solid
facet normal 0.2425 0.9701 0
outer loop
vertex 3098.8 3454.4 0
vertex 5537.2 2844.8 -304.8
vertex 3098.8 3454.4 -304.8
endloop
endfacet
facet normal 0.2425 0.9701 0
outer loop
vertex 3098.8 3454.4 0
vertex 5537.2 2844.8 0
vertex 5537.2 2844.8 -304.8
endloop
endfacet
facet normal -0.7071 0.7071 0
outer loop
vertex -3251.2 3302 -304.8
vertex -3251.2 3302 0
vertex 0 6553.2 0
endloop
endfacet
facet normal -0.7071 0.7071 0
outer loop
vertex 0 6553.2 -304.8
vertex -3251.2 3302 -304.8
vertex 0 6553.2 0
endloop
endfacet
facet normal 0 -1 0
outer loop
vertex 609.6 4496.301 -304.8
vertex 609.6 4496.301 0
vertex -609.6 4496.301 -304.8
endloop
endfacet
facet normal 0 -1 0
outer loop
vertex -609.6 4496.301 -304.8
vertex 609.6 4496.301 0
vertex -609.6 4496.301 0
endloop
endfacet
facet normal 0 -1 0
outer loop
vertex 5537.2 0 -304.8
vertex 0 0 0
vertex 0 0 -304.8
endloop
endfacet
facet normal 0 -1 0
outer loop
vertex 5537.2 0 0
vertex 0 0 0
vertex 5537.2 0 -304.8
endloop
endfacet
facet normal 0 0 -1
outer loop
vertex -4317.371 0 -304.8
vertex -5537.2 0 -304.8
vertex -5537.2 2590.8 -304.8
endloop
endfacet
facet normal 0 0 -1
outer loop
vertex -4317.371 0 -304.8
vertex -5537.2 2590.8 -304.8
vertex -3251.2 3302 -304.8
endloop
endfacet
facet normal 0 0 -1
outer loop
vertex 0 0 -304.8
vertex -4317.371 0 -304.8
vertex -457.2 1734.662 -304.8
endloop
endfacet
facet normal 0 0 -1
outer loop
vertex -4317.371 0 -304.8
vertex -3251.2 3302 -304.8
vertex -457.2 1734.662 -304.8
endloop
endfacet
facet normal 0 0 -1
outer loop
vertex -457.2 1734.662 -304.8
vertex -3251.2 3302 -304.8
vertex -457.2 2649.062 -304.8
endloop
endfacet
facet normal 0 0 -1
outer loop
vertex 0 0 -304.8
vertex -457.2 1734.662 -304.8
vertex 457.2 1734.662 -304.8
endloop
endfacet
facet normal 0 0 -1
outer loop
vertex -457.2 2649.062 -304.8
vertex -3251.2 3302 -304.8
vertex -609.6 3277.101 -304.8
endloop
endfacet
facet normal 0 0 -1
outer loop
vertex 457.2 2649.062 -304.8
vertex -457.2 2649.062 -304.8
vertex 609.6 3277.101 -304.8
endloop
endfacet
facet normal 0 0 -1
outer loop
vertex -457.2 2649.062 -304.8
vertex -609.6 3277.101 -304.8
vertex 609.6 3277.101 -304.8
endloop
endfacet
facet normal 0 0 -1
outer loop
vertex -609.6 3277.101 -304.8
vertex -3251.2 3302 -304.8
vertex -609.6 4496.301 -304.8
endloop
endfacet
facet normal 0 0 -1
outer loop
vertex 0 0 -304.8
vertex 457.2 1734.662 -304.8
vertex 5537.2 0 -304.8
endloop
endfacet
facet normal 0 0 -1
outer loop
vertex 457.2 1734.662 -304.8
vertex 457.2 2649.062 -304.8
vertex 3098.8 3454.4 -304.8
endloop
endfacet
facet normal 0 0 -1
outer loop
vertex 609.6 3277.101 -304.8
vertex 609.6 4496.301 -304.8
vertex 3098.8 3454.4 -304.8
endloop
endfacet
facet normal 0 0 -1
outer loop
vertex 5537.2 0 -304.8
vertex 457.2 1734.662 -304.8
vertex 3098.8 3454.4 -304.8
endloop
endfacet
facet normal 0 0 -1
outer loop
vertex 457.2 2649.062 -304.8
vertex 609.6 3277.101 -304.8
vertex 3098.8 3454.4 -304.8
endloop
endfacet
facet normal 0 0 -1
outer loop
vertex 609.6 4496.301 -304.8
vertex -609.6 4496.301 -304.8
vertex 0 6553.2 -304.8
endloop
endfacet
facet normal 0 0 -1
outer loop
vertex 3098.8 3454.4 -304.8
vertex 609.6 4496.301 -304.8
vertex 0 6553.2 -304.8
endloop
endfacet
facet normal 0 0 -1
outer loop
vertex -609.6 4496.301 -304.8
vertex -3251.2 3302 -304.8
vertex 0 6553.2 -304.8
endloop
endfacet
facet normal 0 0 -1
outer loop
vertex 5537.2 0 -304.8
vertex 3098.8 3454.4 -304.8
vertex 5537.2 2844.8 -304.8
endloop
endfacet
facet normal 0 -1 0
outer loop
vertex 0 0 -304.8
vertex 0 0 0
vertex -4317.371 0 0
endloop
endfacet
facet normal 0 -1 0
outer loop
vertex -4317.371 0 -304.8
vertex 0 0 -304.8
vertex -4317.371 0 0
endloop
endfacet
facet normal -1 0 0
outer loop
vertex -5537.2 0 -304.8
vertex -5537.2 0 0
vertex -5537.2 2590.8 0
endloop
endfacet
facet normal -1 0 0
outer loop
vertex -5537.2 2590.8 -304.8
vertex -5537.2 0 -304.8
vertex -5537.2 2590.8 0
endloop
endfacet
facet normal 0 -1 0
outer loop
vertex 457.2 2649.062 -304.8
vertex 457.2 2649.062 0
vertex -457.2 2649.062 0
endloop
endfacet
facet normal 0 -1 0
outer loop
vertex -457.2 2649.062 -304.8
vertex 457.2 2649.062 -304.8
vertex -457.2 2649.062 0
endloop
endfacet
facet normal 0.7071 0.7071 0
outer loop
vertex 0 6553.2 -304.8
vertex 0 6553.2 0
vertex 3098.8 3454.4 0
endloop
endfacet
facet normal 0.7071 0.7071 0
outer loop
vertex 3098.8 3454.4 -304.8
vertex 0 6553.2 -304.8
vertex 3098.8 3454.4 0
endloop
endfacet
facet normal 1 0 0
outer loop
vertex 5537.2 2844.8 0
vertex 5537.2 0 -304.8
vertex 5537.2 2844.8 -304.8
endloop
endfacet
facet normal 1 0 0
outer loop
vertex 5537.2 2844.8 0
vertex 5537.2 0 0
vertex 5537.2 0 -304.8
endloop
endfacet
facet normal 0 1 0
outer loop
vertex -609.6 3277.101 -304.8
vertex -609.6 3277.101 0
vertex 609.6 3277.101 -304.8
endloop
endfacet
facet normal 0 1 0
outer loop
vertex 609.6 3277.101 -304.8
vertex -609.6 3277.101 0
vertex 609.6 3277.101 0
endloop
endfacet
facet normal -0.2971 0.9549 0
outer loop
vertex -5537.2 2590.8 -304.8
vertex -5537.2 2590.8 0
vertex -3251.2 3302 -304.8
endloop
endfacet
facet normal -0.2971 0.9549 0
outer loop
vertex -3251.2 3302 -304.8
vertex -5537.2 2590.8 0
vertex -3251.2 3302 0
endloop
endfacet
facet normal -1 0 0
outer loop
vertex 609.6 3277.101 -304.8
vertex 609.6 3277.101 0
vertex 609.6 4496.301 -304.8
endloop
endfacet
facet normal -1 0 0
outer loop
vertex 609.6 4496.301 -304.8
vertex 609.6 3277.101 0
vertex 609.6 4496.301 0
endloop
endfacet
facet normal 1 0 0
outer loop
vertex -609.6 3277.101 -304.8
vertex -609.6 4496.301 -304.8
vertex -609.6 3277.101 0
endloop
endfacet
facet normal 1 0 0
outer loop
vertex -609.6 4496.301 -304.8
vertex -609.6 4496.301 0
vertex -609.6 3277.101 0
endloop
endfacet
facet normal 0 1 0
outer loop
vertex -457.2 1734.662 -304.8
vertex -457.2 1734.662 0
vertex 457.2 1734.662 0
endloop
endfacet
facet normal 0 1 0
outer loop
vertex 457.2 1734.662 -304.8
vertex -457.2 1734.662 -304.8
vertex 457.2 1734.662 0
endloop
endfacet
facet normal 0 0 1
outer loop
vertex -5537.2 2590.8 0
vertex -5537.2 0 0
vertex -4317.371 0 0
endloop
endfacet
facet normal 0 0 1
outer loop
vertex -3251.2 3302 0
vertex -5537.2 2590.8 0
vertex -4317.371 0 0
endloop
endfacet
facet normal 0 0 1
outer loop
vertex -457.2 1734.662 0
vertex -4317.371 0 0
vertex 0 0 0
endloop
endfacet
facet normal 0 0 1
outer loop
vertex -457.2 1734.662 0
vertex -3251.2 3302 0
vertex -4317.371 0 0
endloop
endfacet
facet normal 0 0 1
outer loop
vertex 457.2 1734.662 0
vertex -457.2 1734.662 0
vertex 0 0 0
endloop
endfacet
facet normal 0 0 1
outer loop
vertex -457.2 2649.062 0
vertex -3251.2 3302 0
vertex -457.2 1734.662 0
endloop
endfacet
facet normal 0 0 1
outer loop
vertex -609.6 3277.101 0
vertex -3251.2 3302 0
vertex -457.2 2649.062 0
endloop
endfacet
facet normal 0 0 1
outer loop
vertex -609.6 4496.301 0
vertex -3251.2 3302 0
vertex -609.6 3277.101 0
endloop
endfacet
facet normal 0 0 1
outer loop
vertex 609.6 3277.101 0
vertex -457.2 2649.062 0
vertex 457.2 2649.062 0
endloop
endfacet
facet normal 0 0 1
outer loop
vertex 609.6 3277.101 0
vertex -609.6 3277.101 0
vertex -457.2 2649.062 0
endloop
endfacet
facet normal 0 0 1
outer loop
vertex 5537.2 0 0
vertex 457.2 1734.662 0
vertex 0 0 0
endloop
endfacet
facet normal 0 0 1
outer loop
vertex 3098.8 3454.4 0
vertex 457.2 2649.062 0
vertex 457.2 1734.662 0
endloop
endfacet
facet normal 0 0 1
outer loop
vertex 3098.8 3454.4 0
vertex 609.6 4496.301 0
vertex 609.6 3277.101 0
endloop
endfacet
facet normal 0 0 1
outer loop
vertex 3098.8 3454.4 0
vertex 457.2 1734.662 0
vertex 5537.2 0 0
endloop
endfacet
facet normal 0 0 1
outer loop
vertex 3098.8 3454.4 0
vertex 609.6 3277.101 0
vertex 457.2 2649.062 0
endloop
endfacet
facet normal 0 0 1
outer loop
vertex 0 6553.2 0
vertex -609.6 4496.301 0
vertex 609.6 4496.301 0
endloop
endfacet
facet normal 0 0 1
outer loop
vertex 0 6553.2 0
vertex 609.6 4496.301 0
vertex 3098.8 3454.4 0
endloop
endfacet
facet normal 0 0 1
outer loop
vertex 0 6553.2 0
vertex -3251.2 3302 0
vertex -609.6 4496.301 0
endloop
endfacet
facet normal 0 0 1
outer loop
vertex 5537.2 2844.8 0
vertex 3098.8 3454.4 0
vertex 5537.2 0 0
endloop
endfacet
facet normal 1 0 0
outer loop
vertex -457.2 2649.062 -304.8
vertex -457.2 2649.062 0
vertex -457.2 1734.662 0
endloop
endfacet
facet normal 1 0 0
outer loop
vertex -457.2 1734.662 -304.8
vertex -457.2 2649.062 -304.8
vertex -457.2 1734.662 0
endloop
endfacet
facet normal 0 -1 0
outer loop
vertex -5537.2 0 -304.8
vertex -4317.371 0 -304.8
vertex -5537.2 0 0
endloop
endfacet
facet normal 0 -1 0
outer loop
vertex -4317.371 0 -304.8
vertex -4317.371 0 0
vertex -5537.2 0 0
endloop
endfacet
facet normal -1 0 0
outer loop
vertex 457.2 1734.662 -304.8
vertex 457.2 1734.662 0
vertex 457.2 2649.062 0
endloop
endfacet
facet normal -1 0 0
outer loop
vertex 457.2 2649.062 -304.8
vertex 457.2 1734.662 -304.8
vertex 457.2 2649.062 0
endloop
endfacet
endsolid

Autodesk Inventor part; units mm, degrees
ref_plane "YZ Plane" through (0, 0, 0) normal (1, 0, 0) x (0, 1, 0)
ref_plane "XZ Plane" through (0, 0, 0) normal (0, 1, 0) x (-1, 0, 0)
ref_plane "XY Plane" through (0, 0, 0) normal (0, 0, 1) x (1, 0, 0)
sketch "Sketch1" plane through (0, 0, 0) normal (0, 0, 1) x (1, 0, 0)
  line L0 (0, 0) -> (5537.2, 0)
  line L1 (0, 0) -> (-5537.2, 0)
  line L2 (-5537.2, 0) -> (-4317.3707, 0)
  line L3 (-5537.2, 0) -> (-5537.2, 2590.8)
  line L4 (-5537.2, 2590.8) -> (-3251.2, 3302)
  line L5 (-3251.2, 3302) -> (0, 6553.2)
  line L6 (0, 0) -> (0, 6553.2) construction
  line L7 (-3251.2, 3302) -> (-3251.2, 0) construction
  line L8 (0, 6553.2) -> (3098.8, 3454.4)
  line L9 (5537.2, 0) -> (5537.2, 2844.8)
  line L10 (5537.2, 2844.8) -> (3098.8, 3454.4)
  line L11 (3098.8, 3454.4) -> (3098.8, 0) construction
  line L12 (-457.2, 1734.6619) -> (457.2, 1734.6619)
  line L13 (457.2, 1734.6619) -> (457.2, 2649.0619)
  line L14 (457.2, 2649.0619) -> (-457.2, 2649.0619)
  line L15 (-457.2, 2649.0619) -> (-457.2, 1734.6619)
  line L16 (-457.2, 1734.6619) -> (457.2, 2649.0619) construction
  line L17 (457.2, 1734.6619) -> (-457.2, 2649.0619) construction
  line L18 (-609.6, 3277.1011) -> (609.6, 3277.1011)
  line L19 (609.6, 3277.1011) -> (609.6, 4496.3011)
  line L20 (609.6, 4496.3011) -> (-609.6, 4496.3011)
  line L21 (-609.6, 4496.3011) -> (-609.6, 3277.1011)
  line L22 (-609.6, 3277.1011) -> (609.6, 4496.3011) construction
  line L23 (609.6, 3277.1011) -> (-609.6, 4496.3011) construction
  point P0 (0, 2191.8619)
  point P1 (0, 3886.7011)
  dimension "d0" = 5537.2
  dimension "d1" = 5537.2
  dimension "d2" = 2590.8
  dimension "d3" = 6553.2
  dimension "d4" = 45
  dimension "d5" = 3302
  dimension "d6" = 3454.4
  dimension "d7" = 45
  dimension "d8" = 914.4
  dimension "d9" = 914.4
  dimension "d10" = 1219.2
  dimension "d11" = 1219.2
  dimension "d14" = 2844.8
  dimension "d15" = 2394.0763
  dimension "d16" = 4597.8911
  dimension "d17" = 4382.365
  dimension "d18" = 2513.4452
extrude "Extrusion1" add sketch "Sketch1" against normal blind 304.8
properties part number "backOfHouseForSiding"
